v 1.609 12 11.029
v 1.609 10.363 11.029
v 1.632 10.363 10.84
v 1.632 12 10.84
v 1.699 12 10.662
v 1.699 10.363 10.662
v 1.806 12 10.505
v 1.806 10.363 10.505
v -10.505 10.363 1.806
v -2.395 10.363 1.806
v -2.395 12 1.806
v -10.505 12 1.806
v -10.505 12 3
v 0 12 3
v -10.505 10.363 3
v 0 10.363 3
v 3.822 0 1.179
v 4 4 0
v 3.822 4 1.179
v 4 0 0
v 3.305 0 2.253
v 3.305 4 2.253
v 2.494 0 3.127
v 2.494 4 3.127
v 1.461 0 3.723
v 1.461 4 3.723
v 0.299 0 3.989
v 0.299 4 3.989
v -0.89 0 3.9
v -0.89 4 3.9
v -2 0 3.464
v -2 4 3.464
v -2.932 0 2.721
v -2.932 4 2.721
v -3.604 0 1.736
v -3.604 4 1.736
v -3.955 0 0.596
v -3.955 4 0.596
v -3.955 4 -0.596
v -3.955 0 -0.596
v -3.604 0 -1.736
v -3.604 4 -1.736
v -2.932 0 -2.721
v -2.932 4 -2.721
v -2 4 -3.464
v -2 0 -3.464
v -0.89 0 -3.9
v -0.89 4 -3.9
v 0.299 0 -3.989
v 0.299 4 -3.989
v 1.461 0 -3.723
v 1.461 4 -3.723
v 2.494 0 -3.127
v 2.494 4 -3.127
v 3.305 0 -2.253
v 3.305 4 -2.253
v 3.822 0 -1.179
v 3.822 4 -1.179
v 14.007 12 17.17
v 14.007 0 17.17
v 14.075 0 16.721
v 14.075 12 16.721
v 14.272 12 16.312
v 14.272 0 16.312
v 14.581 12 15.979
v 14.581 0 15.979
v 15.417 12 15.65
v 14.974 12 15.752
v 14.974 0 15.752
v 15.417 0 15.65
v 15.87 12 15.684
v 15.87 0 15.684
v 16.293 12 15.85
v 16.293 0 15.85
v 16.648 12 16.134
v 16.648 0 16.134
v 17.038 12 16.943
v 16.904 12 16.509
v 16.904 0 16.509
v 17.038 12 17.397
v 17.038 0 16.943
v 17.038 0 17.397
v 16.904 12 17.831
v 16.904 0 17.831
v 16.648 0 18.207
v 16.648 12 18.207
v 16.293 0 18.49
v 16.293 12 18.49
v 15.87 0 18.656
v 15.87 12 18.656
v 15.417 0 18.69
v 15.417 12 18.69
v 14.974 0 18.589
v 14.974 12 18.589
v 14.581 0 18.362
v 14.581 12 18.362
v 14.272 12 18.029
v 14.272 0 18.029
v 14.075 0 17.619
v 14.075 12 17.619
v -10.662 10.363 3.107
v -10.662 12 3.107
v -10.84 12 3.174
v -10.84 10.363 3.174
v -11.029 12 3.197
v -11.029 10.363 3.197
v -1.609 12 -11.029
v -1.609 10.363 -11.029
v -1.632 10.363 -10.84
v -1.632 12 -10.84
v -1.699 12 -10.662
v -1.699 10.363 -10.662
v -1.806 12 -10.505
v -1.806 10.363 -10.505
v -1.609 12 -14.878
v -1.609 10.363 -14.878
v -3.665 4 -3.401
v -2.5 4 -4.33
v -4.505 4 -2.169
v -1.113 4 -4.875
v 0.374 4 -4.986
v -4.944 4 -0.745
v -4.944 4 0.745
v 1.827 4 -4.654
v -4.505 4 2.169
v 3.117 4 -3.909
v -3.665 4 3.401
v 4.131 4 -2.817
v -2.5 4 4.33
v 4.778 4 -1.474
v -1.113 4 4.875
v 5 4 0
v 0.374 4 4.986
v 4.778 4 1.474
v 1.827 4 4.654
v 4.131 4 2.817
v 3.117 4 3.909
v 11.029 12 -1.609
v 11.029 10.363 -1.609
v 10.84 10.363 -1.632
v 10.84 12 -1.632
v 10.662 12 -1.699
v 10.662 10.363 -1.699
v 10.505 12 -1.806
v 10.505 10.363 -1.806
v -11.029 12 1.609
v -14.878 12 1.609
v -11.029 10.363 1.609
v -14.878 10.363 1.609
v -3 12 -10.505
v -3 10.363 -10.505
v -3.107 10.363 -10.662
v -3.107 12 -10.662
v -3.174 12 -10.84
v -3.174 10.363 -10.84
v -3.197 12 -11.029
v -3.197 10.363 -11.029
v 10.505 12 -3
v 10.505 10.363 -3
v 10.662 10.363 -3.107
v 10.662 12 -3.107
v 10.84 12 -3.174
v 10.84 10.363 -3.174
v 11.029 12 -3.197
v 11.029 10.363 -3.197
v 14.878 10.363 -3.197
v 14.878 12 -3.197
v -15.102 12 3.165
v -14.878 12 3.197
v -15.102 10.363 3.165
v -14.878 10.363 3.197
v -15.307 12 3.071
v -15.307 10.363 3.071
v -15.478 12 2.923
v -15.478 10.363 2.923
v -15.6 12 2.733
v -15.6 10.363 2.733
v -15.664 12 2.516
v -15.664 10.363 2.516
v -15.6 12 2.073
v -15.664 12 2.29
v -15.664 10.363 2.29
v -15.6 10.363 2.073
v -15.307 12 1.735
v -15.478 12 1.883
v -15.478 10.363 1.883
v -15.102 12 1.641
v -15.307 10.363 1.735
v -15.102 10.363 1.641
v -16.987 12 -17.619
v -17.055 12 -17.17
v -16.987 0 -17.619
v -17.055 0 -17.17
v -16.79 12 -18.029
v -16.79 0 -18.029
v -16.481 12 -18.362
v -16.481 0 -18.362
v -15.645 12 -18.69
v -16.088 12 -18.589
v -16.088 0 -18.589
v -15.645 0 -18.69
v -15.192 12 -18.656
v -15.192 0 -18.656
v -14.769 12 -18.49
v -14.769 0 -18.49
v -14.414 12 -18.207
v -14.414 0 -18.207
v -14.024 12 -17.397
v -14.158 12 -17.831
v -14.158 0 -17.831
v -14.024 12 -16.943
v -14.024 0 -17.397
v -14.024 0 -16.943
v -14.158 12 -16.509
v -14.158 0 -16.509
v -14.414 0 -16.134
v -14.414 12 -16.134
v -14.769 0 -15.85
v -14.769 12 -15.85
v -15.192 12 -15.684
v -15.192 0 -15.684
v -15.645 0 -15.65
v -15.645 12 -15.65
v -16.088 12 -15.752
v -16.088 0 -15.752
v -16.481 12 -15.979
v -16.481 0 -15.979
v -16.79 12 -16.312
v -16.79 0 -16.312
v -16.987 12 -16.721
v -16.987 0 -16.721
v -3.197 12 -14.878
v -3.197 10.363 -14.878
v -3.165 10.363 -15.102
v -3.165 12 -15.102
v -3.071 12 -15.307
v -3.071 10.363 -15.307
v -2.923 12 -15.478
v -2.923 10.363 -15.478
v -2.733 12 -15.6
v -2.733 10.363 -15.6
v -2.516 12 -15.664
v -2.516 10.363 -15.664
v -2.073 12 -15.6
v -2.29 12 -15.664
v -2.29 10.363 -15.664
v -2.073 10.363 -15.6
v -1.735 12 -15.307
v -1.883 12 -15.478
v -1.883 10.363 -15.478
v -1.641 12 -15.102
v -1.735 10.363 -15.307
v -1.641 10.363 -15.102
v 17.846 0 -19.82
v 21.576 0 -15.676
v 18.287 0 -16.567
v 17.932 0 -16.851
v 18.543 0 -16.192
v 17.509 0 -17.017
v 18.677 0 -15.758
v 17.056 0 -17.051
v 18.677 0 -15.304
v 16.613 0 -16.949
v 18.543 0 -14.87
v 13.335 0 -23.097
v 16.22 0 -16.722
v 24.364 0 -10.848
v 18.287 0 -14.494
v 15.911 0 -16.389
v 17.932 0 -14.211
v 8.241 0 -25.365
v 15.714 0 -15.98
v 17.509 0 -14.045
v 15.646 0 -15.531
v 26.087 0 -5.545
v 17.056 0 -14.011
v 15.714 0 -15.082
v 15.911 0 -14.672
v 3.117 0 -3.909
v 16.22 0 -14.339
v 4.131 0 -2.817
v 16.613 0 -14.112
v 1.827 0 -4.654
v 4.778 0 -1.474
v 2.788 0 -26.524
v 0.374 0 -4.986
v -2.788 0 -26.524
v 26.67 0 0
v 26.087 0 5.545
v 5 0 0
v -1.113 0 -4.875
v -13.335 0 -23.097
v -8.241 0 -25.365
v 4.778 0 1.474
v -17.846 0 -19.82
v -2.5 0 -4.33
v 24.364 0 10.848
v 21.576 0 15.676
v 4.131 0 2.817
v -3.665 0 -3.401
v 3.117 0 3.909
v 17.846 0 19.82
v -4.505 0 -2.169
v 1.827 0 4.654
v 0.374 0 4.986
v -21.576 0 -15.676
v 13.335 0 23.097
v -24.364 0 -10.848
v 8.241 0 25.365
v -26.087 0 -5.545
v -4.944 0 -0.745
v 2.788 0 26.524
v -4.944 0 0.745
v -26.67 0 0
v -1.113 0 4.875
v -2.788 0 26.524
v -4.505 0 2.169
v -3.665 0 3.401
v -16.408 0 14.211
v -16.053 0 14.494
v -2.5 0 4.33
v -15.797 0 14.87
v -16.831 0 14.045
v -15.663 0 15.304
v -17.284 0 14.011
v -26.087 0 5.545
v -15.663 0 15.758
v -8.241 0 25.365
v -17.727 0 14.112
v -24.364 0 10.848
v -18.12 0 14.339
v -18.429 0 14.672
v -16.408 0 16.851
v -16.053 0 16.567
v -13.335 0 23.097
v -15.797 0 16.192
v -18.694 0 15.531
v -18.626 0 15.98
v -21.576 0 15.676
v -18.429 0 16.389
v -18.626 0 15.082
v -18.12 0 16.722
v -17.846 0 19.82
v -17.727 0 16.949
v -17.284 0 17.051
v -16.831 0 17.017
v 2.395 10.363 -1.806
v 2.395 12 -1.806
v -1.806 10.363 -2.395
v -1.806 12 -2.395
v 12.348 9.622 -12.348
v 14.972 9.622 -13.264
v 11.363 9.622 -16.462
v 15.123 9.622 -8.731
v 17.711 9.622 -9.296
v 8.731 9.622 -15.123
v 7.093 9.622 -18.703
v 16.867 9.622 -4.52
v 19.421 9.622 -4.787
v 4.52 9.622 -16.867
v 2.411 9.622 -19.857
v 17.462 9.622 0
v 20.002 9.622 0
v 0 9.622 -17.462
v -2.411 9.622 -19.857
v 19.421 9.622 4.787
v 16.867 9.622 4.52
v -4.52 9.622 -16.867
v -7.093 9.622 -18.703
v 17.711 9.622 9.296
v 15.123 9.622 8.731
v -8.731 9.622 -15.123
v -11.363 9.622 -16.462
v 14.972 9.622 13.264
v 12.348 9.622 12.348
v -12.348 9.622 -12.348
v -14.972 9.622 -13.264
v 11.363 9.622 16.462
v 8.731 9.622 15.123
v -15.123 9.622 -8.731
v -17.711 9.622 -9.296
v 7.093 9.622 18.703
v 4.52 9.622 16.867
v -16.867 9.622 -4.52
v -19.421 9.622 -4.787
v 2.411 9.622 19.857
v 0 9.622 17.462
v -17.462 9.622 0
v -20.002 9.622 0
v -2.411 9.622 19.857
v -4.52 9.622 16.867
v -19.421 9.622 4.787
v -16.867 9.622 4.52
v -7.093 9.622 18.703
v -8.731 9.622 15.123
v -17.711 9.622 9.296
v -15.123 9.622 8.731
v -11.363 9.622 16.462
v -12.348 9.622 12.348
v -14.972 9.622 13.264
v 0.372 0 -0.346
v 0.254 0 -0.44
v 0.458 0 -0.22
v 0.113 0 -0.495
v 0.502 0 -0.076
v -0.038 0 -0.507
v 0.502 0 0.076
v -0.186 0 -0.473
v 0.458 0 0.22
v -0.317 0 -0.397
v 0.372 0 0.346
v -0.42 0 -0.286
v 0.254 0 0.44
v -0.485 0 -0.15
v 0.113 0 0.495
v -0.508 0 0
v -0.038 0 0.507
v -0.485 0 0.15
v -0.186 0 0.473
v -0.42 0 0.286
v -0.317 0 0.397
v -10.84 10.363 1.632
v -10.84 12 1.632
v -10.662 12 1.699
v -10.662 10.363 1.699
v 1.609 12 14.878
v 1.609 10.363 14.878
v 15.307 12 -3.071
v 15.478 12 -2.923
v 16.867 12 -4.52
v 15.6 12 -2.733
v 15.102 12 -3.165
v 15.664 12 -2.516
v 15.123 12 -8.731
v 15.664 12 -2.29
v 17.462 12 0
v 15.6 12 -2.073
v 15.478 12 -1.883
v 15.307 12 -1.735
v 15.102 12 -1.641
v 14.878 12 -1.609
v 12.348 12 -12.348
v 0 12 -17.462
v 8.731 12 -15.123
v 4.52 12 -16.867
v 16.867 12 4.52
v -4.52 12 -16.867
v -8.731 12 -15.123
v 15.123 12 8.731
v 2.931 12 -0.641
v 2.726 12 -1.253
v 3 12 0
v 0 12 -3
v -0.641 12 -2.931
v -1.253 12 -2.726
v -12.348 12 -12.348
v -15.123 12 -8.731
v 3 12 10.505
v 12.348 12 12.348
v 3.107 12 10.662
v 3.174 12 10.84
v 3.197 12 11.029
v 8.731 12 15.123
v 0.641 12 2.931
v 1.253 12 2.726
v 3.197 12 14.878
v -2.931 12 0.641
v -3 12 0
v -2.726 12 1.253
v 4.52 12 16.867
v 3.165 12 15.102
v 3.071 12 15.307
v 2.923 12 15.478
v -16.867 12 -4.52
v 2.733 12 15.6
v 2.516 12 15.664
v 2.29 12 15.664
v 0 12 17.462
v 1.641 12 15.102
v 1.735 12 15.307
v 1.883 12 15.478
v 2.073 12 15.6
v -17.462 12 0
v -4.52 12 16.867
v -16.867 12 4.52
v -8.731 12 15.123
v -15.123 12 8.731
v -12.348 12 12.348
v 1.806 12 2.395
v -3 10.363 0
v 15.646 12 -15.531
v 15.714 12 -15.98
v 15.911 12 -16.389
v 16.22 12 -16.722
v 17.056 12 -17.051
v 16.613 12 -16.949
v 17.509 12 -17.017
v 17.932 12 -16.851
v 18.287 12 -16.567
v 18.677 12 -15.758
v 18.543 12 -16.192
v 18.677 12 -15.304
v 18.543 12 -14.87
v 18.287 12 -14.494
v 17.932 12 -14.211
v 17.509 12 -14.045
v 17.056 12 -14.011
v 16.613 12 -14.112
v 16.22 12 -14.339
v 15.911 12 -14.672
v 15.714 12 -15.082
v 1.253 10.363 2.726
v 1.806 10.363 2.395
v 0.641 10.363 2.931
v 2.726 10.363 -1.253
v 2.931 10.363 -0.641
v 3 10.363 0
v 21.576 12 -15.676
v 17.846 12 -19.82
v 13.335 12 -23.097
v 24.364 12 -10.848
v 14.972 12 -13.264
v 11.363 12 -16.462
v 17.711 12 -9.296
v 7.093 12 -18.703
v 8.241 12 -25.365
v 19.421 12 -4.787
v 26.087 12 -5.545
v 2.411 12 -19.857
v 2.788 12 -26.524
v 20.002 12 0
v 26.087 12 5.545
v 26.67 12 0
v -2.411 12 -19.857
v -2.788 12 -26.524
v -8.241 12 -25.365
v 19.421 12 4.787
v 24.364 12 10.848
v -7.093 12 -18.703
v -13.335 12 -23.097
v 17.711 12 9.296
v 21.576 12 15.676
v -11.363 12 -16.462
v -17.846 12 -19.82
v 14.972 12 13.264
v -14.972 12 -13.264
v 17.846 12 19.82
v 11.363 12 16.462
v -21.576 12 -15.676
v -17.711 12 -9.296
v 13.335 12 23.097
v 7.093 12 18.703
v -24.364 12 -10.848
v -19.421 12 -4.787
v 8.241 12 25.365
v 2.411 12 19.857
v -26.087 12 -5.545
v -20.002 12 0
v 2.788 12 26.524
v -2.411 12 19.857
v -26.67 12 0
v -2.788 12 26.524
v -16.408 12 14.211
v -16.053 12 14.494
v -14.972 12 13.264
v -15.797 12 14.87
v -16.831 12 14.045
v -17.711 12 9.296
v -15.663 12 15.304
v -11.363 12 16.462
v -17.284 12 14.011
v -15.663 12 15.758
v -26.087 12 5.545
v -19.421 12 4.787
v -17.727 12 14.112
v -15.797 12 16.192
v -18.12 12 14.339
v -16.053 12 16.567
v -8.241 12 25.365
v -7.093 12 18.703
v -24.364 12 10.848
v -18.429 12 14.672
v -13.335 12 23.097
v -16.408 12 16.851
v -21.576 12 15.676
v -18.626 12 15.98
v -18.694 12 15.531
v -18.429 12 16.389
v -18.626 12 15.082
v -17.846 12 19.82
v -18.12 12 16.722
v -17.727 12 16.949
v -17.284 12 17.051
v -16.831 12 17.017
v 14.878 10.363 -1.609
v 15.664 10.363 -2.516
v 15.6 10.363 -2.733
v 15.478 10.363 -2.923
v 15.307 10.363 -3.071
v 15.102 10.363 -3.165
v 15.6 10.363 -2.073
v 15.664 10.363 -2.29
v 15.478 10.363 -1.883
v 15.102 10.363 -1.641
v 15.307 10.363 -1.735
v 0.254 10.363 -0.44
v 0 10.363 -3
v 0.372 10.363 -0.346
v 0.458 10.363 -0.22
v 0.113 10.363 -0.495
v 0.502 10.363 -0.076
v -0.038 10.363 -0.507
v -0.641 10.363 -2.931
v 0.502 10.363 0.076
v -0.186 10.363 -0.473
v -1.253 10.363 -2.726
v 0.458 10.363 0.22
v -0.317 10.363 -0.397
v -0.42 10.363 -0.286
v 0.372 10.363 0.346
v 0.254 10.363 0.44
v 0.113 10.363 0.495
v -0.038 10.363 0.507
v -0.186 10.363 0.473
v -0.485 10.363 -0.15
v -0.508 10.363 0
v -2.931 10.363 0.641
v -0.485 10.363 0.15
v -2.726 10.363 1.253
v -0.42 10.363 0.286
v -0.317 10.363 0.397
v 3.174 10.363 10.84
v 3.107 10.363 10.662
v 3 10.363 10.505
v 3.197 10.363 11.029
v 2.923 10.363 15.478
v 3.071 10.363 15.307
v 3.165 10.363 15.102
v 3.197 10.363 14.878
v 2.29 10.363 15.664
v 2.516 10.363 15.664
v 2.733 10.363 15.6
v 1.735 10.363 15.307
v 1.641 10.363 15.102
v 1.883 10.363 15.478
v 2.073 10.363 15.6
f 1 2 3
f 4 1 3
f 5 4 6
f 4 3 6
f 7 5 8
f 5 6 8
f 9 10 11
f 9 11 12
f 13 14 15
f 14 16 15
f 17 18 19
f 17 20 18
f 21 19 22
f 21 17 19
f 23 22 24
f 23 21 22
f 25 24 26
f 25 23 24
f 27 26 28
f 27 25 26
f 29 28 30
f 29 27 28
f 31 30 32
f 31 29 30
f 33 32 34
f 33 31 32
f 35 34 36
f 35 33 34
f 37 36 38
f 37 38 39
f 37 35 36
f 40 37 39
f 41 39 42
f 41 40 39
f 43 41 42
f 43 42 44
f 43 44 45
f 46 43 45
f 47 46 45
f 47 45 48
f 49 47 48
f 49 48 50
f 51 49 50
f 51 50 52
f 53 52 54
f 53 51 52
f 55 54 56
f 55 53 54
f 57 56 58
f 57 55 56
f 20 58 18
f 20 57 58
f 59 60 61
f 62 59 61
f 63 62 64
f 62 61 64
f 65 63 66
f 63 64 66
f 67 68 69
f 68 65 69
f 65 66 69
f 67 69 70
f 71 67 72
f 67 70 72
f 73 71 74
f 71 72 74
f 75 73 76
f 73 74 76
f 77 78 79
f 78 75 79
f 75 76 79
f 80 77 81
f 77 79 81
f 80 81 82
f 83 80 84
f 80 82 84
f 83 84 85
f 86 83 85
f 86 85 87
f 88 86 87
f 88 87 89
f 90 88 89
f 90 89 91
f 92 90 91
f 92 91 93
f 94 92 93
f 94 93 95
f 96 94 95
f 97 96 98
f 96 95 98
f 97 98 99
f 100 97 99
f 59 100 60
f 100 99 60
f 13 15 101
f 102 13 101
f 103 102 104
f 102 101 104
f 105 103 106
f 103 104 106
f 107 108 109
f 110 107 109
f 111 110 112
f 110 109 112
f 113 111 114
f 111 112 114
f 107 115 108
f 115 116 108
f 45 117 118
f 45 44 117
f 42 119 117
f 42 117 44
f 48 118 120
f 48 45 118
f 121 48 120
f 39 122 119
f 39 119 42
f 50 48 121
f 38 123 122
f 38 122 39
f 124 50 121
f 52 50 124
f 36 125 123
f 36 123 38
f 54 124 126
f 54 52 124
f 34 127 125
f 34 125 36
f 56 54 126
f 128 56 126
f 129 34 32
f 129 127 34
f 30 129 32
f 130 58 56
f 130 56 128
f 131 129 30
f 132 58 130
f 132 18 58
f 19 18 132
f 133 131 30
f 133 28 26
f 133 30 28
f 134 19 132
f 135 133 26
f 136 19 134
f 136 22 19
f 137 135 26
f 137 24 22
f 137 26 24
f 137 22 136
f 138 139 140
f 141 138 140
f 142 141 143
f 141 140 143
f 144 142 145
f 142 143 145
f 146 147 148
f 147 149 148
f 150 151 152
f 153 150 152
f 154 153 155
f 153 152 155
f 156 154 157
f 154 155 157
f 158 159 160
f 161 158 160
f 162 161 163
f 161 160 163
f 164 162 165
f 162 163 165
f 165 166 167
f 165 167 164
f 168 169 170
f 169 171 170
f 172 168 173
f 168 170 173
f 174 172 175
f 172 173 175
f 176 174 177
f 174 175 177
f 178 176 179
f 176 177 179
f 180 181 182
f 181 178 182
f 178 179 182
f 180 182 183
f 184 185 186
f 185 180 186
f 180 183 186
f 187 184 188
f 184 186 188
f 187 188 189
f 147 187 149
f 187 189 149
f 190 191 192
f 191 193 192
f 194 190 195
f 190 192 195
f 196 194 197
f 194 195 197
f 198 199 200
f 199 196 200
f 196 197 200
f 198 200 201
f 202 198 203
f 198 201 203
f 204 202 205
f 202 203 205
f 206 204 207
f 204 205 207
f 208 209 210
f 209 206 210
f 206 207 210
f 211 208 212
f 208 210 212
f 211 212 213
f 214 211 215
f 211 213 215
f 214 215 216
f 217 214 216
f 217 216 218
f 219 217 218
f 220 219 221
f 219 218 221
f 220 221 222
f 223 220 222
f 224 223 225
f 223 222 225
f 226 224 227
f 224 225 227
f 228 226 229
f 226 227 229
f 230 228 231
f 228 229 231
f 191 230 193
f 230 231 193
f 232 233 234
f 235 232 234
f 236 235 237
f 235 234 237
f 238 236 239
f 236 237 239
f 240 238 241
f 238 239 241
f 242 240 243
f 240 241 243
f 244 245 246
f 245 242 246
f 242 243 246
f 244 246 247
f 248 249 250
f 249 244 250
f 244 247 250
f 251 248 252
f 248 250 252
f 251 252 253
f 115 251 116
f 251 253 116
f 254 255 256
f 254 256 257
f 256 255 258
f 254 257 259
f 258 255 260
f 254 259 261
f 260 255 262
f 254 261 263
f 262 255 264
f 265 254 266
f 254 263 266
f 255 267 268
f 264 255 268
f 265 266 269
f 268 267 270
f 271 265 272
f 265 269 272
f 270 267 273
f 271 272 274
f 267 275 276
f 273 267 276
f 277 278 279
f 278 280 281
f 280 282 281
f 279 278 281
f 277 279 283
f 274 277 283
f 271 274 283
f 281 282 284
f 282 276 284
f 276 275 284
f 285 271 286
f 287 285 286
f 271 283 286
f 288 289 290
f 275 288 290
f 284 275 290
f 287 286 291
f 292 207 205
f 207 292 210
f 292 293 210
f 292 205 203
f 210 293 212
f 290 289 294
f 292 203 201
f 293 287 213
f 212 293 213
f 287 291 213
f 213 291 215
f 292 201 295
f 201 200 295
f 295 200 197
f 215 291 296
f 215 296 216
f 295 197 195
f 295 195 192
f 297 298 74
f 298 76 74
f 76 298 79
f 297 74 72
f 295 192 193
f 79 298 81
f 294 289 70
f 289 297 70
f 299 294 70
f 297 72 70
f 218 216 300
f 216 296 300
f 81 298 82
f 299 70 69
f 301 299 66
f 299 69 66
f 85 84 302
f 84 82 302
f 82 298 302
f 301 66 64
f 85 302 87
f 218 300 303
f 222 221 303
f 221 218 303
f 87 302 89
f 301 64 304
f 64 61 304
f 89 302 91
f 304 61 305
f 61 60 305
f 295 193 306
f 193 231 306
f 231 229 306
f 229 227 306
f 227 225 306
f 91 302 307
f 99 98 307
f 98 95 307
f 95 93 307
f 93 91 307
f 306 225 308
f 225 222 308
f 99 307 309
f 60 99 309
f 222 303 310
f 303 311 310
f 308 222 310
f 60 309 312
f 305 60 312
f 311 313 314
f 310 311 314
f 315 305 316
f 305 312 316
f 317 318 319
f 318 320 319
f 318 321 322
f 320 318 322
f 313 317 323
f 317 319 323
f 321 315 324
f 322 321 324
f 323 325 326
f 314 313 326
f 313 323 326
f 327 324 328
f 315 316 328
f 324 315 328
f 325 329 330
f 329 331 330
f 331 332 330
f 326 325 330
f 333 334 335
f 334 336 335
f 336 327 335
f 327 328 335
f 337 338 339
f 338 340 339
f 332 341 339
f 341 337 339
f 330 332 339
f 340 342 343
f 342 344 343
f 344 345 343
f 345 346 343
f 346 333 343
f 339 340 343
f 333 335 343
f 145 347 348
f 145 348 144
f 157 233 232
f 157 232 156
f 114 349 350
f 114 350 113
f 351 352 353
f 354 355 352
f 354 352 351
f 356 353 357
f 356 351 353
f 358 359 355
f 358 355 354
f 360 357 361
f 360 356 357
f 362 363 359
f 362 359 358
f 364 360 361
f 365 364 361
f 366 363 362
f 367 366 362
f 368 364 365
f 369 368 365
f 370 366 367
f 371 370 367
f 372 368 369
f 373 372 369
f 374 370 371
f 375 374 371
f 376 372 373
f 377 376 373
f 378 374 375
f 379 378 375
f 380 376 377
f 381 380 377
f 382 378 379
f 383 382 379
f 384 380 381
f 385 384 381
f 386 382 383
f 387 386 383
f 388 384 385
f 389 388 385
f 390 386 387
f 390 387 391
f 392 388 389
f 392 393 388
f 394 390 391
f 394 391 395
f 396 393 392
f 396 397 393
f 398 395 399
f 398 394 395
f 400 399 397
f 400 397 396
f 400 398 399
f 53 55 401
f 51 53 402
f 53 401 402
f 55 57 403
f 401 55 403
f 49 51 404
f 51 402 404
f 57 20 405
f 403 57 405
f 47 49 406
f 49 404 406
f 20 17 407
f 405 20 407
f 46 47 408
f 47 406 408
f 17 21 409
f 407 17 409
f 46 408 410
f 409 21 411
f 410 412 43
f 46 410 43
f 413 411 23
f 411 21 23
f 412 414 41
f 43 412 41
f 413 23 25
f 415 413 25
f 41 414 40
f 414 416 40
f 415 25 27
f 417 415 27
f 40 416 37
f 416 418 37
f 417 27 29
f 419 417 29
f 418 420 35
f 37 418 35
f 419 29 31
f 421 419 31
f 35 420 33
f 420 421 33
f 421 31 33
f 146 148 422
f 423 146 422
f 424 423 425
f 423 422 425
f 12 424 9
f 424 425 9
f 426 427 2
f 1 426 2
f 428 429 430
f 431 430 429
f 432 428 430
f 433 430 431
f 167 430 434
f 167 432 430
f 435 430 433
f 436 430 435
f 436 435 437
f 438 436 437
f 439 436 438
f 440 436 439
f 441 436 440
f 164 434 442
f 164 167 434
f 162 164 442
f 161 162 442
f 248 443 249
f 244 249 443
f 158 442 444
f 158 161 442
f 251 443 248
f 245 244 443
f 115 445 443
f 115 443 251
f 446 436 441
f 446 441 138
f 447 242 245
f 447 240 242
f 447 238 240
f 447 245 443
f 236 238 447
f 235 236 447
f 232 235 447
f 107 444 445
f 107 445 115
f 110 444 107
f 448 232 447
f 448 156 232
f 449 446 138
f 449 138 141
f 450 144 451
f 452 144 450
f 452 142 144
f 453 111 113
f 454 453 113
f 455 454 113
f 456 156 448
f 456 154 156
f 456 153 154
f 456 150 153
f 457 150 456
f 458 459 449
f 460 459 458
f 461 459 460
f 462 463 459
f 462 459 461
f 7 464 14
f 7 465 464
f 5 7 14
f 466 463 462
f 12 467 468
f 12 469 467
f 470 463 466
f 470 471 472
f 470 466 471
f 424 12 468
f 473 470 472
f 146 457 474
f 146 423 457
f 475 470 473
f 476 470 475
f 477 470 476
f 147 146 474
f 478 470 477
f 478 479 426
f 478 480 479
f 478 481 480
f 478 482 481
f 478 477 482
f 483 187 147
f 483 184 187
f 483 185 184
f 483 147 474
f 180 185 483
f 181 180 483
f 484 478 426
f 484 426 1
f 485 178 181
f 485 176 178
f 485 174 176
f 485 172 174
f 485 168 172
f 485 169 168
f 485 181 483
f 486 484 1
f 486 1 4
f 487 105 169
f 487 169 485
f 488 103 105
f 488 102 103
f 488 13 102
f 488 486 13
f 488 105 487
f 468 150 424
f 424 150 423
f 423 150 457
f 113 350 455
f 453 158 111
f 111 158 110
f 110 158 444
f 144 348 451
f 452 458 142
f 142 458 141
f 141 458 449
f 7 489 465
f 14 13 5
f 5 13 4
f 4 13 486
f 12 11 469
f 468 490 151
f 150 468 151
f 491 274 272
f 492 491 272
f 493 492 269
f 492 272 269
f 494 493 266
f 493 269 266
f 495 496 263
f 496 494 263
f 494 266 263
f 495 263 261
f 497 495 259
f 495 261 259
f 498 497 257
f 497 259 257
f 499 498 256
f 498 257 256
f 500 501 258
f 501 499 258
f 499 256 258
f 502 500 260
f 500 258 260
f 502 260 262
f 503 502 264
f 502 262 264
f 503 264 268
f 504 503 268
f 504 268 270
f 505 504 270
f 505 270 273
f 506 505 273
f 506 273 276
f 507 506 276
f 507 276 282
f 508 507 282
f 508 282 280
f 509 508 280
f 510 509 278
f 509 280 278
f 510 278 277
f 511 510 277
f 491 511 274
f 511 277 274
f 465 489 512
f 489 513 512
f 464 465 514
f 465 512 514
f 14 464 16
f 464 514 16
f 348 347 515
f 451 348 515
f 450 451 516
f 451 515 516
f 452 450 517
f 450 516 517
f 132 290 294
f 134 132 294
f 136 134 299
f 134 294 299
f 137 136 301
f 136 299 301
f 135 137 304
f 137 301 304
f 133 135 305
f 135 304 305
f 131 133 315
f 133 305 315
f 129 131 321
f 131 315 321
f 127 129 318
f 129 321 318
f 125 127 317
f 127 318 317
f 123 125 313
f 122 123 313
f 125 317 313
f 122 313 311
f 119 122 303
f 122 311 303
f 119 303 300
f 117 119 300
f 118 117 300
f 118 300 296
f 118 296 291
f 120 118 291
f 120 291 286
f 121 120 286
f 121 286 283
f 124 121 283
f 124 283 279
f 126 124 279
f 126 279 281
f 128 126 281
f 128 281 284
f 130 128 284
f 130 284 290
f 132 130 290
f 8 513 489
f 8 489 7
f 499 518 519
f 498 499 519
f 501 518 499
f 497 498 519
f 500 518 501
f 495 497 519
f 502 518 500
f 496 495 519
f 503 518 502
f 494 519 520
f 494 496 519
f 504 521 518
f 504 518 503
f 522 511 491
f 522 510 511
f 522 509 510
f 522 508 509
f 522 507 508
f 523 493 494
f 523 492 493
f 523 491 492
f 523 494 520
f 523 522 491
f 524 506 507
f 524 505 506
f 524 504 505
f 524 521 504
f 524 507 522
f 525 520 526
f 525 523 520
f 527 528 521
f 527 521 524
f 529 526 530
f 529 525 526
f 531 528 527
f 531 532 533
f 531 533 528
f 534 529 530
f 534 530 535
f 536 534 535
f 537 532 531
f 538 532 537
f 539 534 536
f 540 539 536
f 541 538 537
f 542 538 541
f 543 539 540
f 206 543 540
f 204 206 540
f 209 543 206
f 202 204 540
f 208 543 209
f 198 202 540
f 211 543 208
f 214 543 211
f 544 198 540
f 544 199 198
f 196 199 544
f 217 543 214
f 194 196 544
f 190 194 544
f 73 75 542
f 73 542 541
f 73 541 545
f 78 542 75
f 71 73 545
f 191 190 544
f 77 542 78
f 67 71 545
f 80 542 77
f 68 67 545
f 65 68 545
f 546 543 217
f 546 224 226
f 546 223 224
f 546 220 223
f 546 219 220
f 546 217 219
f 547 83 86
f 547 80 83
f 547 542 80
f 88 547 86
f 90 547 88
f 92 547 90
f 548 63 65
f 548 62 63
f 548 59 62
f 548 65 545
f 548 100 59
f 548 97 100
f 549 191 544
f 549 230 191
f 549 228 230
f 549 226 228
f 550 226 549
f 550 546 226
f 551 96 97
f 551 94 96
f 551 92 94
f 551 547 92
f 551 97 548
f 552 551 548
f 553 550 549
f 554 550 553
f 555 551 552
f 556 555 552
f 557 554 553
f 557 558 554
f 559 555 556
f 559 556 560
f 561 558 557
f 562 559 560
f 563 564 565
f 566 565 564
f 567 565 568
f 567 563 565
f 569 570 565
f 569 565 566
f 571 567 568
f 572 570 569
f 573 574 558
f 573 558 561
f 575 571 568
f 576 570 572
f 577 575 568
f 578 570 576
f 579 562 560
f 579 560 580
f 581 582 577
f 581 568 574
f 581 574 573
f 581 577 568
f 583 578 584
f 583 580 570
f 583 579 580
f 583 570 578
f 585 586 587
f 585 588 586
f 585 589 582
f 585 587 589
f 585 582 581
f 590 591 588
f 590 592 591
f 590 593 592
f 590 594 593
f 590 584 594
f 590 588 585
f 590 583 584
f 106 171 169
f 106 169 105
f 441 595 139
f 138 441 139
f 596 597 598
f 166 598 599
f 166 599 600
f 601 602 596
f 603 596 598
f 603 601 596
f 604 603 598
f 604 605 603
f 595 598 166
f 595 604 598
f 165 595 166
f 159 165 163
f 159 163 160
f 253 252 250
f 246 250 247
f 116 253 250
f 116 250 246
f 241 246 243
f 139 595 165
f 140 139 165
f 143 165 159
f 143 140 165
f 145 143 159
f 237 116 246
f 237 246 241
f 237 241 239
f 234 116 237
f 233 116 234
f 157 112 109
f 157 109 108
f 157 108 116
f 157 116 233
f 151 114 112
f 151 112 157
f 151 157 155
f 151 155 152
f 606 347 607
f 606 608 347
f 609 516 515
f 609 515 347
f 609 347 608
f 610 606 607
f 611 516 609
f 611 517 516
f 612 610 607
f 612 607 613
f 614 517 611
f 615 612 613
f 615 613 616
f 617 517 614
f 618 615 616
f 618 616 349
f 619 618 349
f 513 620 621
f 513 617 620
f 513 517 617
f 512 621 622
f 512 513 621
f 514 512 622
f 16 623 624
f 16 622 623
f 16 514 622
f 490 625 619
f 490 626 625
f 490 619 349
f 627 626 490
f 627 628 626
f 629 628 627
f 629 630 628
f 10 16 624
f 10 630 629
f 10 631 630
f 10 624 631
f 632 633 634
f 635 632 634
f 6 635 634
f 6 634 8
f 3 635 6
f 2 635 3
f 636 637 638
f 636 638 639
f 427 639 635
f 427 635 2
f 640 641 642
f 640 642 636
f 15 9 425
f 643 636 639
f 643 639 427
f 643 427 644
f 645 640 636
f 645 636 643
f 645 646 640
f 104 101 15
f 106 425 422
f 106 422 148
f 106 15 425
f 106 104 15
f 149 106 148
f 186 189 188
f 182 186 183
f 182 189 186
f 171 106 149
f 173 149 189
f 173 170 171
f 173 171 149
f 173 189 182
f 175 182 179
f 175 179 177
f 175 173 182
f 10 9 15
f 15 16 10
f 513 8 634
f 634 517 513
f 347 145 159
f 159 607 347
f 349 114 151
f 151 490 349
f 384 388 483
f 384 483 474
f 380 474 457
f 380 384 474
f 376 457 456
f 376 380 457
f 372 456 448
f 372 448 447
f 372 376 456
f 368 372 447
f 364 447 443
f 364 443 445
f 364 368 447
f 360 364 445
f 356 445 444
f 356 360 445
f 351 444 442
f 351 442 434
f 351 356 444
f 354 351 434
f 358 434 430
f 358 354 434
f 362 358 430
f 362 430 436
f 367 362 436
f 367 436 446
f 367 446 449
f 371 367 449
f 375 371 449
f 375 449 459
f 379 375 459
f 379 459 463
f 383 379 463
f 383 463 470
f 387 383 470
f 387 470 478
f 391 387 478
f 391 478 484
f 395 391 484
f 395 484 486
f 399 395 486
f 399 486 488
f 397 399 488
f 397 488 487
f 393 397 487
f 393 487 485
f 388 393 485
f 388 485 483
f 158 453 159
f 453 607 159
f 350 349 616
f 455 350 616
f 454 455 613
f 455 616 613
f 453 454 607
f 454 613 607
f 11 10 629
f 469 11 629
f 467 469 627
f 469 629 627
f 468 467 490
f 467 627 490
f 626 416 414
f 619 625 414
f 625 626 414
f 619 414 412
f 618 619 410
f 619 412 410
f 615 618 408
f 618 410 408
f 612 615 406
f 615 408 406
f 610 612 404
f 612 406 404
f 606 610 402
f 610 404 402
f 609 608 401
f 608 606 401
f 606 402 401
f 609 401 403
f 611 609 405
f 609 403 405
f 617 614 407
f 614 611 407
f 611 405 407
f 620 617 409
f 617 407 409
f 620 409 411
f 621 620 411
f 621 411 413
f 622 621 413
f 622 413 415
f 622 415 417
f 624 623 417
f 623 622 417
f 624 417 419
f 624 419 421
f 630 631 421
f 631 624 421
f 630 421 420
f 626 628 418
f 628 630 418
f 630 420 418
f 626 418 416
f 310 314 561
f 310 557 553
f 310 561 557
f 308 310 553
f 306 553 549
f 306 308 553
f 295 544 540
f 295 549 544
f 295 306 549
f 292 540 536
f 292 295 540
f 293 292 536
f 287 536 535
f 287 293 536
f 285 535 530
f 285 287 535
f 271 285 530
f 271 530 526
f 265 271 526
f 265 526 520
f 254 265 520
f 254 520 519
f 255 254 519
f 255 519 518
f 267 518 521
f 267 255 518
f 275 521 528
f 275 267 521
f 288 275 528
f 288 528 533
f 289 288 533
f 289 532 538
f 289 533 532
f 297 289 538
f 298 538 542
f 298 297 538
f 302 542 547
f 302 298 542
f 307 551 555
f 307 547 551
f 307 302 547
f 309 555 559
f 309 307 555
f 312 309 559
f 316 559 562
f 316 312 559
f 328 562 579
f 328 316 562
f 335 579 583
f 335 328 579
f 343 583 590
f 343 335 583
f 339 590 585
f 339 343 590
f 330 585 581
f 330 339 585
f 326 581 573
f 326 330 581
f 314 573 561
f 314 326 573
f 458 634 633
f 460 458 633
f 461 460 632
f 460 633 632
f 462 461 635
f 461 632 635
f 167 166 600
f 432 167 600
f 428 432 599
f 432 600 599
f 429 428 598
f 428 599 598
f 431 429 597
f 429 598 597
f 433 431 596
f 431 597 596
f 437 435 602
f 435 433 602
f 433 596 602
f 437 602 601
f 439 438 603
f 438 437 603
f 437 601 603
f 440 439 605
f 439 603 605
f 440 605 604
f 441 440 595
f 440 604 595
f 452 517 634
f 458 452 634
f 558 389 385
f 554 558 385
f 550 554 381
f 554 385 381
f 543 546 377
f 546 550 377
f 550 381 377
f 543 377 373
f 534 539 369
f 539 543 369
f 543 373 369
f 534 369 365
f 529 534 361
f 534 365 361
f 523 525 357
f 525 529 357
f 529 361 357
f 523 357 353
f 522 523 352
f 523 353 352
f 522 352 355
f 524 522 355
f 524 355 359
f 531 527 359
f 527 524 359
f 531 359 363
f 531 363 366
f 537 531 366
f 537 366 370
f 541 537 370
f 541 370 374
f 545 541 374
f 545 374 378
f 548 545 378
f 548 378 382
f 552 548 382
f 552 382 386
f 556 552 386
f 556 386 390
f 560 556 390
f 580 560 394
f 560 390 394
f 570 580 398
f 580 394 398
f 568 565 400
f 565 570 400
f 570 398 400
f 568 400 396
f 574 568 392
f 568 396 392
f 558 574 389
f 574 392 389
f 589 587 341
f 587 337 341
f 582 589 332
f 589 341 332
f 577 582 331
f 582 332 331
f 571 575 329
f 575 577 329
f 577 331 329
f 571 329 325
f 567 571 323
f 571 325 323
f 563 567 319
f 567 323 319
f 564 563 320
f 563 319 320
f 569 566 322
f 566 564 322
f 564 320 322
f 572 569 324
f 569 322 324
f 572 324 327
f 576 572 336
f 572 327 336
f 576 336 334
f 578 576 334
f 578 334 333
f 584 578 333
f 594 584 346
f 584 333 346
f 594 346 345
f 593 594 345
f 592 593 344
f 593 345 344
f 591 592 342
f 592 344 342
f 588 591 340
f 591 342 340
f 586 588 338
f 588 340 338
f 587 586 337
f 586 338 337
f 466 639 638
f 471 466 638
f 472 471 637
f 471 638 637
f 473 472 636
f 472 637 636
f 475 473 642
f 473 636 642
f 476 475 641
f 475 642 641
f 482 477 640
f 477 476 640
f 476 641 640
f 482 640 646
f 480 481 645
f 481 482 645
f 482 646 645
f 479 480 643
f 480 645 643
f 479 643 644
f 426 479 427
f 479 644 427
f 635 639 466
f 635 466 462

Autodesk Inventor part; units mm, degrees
ref_plane "YZ Plane" through (0, 0, 0) normal (1, 0, 0) x (0, 1, 0)
ref_plane "XZ Plane" through (0, 0, 0) normal (0, 1, 0) x (-1, 0, 0)
ref_plane "XY Plane" through (0, 0, 0) normal (0, 0, 1) x (1, 0, 0)
sketch "Sketch1" plane through (0, 0, 0) normal (0, 1, 0) x (-1, 0, 0)
  circle A0 centre (0, 0) radius 0.508
  circle A1 centre (0, 0) radius 3
  line L0 (1.8062, -2.3953) -> (1.8062, -10.5053)
  arc A2 (1.6092, -14.8779) -> (3.197, -14.8779) centre (2.4031, -14.8779) ccw
  line L1 (3.197, -14.8779) -> (3.197, -11.0287)
  line L2 (1.6092, -14.8779) -> (1.6092, -11.0287)
  line L3 (3, 0) -> (3, -10.5053)
  arc A3 (3.197, -11.0287) -> (3, -10.5053) centre (2.4031, -11.0287) ccw
  arc A4 (1.8062, -10.5053) -> (1.6092, -11.0287) centre (2.4031, -11.0287) ccw
  line L4 (0, 3) -> (10.5053, 3)
  line L5 (14.8779, 3.197) -> (11.0287, 3.197)
  line L6 (14.8779, 1.6092) -> (11.0287, 1.6092)
  arc A5 (14.8779, 1.6092) -> (14.8779, 3.197) centre (14.8779, 2.4031) ccw
  arc A6 (11.0287, 3.197) -> (10.5053, 3) centre (11.0287, 2.4031) ccw
  arc A7 (10.5053, 1.8062) -> (11.0287, 1.6092) centre (11.0287, 2.4031) ccw
  line L7 (2.3953, 1.8062) -> (10.5053, 1.8062)
  line L8 (-3, 0) -> (-3, 10.5053)
  line L9 (-3.197, 14.8779) -> (-3.197, 11.0287)
  line L10 (-1.6092, 14.8779) -> (-1.6092, 11.0287)
  arc A8 (-1.6092, 14.8779) -> (-3.197, 14.8779) centre (-2.4031, 14.8779) ccw
  arc A9 (-3.197, 11.0287) -> (-3, 10.5053) centre (-2.4031, 11.0287) ccw
  arc A10 (-1.8062, 10.5053) -> (-1.6092, 11.0287) centre (-2.4031, 11.0287) ccw
  line L11 (-1.8062, 2.3953) -> (-1.8062, 10.5053)
  line L12 (0, -3) -> (-10.5053, -3)
  line L13 (-14.8779, -3.197) -> (-11.0287, -3.197)
  line L14 (-14.8779, -1.6092) -> (-11.0287, -1.6092)
  arc A11 (-14.8779, -1.6092) -> (-14.8779, -3.197) centre (-14.8779, -2.4031) ccw
  arc A12 (-11.0287, -3.197) -> (-10.5053, -3) centre (-11.0287, -2.4031) ccw
  arc A13 (-10.5053, -1.8062) -> (-11.0287, -1.6092) centre (-11.0287, -2.4031) ccw
  line L15 (-2.3953, -1.8062) -> (-10.5053, -1.8062)
  circle A14 centre (0, 0) radius 17.4625
  circle A15 centre (0, 0) radius 20.0025
  circle A16 centre (0, 0) radius 26.67
  line L16 (0, 0) -> (26.67, 0) construction
  circle A17 centre (15.5308, -17.1702) radius 1.524
  circle A18 centre (17.1702, 15.5308) radius 1.524
  circle A19 centre (-15.5308, 17.1702) radius 1.524
  circle A20 centre (-17.1702, -15.5308) radius 1.524
  arc A21 (3.197, -11.0287) -> (1.6092, -11.0287) centre (2.4031, -11.0287) ccw
  arc A22 (11.0287, 3.197) -> (11.0287, 1.6092) centre (11.0287, 2.4031) ccw
  arc A23 (-3.197, 11.0287) -> (-1.6092, 11.0287) centre (-2.4031, 11.0287) ccw
  arc A24 (-11.0287, -3.197) -> (-11.0287, -1.6092) centre (-11.0287, -2.4031) ccw
  line L17 (0, 0) -> (14.8779, 0)
  line L18 (17.0946, 3.5656) -> (17.0946, 3)
  line L19 (17.0946, 1.8062) -> (17.0946, 1.6092)
  point P0 (2.4031, -15.6718)
  dimension "d16" = 34.925
  dimension "d0" = 1.016
  dimension "d1" = 6
  dimension "d13" = 360
  dimension "d17" = 40.005
  dimension "d18" = 53.34
  dimension "d24" = 360
  dimension "d28" = 360
  dimension "d44" = 17.1702
extrude "Extrusion1" add sketch "Sketch1" along normal blind 12 contours A14 | A16
extrude "Extrusion2" add sketch "Sketch1" along normal blind 10.3632 contours A1 | L3 A21 L0 A1 | A1 L4 A22 L7 | A3 L1 A2 L2 A4 A21 | A22 A6 L5 A5 L6 A7 | L12 A24 L15 A1 | A1 L8 A23 L11 | A12 L13 A11 L14 A13 A24 | A23 A9 L9 A8 L10 A10
extrude "Extrusion3" add sketch "Sketch1" along normal blind 9.6215 contours A15
thread "Thread1" size "M3x0.5" class "6H" standard "ANSI Metric M Profile" length 10
thread "Thread2" size "M3x0.5" class "6H" standard "ANSI Metric M Profile" length 10
thread "Thread3" size "M3x0.5" class "6H" standard "ANSI Metric M Profile" length 10
thread "Thread4" size "M3x0.5" class "6H" standard "ANSI Metric M Profile" length 10
sketch "Sketch2" plane through (0, 0, 0) normal (0, -1, 0) x (1, 0, 0)
  circle A0 centre (0, 0) radius 4
  circle A1 centre (0, 0) radius 0.508 projected
  circle A2 centre (0, 0) radius 5
  dimension "d46" = 8
  dimension "d47" = 10
extrude "Extrusion4" cut sketch "Sketch2" against normal blind 4 contours A2
thread "Thread5" size "M8x1.25" class "6g" standard "ANSI Metric M Profile" length 10
